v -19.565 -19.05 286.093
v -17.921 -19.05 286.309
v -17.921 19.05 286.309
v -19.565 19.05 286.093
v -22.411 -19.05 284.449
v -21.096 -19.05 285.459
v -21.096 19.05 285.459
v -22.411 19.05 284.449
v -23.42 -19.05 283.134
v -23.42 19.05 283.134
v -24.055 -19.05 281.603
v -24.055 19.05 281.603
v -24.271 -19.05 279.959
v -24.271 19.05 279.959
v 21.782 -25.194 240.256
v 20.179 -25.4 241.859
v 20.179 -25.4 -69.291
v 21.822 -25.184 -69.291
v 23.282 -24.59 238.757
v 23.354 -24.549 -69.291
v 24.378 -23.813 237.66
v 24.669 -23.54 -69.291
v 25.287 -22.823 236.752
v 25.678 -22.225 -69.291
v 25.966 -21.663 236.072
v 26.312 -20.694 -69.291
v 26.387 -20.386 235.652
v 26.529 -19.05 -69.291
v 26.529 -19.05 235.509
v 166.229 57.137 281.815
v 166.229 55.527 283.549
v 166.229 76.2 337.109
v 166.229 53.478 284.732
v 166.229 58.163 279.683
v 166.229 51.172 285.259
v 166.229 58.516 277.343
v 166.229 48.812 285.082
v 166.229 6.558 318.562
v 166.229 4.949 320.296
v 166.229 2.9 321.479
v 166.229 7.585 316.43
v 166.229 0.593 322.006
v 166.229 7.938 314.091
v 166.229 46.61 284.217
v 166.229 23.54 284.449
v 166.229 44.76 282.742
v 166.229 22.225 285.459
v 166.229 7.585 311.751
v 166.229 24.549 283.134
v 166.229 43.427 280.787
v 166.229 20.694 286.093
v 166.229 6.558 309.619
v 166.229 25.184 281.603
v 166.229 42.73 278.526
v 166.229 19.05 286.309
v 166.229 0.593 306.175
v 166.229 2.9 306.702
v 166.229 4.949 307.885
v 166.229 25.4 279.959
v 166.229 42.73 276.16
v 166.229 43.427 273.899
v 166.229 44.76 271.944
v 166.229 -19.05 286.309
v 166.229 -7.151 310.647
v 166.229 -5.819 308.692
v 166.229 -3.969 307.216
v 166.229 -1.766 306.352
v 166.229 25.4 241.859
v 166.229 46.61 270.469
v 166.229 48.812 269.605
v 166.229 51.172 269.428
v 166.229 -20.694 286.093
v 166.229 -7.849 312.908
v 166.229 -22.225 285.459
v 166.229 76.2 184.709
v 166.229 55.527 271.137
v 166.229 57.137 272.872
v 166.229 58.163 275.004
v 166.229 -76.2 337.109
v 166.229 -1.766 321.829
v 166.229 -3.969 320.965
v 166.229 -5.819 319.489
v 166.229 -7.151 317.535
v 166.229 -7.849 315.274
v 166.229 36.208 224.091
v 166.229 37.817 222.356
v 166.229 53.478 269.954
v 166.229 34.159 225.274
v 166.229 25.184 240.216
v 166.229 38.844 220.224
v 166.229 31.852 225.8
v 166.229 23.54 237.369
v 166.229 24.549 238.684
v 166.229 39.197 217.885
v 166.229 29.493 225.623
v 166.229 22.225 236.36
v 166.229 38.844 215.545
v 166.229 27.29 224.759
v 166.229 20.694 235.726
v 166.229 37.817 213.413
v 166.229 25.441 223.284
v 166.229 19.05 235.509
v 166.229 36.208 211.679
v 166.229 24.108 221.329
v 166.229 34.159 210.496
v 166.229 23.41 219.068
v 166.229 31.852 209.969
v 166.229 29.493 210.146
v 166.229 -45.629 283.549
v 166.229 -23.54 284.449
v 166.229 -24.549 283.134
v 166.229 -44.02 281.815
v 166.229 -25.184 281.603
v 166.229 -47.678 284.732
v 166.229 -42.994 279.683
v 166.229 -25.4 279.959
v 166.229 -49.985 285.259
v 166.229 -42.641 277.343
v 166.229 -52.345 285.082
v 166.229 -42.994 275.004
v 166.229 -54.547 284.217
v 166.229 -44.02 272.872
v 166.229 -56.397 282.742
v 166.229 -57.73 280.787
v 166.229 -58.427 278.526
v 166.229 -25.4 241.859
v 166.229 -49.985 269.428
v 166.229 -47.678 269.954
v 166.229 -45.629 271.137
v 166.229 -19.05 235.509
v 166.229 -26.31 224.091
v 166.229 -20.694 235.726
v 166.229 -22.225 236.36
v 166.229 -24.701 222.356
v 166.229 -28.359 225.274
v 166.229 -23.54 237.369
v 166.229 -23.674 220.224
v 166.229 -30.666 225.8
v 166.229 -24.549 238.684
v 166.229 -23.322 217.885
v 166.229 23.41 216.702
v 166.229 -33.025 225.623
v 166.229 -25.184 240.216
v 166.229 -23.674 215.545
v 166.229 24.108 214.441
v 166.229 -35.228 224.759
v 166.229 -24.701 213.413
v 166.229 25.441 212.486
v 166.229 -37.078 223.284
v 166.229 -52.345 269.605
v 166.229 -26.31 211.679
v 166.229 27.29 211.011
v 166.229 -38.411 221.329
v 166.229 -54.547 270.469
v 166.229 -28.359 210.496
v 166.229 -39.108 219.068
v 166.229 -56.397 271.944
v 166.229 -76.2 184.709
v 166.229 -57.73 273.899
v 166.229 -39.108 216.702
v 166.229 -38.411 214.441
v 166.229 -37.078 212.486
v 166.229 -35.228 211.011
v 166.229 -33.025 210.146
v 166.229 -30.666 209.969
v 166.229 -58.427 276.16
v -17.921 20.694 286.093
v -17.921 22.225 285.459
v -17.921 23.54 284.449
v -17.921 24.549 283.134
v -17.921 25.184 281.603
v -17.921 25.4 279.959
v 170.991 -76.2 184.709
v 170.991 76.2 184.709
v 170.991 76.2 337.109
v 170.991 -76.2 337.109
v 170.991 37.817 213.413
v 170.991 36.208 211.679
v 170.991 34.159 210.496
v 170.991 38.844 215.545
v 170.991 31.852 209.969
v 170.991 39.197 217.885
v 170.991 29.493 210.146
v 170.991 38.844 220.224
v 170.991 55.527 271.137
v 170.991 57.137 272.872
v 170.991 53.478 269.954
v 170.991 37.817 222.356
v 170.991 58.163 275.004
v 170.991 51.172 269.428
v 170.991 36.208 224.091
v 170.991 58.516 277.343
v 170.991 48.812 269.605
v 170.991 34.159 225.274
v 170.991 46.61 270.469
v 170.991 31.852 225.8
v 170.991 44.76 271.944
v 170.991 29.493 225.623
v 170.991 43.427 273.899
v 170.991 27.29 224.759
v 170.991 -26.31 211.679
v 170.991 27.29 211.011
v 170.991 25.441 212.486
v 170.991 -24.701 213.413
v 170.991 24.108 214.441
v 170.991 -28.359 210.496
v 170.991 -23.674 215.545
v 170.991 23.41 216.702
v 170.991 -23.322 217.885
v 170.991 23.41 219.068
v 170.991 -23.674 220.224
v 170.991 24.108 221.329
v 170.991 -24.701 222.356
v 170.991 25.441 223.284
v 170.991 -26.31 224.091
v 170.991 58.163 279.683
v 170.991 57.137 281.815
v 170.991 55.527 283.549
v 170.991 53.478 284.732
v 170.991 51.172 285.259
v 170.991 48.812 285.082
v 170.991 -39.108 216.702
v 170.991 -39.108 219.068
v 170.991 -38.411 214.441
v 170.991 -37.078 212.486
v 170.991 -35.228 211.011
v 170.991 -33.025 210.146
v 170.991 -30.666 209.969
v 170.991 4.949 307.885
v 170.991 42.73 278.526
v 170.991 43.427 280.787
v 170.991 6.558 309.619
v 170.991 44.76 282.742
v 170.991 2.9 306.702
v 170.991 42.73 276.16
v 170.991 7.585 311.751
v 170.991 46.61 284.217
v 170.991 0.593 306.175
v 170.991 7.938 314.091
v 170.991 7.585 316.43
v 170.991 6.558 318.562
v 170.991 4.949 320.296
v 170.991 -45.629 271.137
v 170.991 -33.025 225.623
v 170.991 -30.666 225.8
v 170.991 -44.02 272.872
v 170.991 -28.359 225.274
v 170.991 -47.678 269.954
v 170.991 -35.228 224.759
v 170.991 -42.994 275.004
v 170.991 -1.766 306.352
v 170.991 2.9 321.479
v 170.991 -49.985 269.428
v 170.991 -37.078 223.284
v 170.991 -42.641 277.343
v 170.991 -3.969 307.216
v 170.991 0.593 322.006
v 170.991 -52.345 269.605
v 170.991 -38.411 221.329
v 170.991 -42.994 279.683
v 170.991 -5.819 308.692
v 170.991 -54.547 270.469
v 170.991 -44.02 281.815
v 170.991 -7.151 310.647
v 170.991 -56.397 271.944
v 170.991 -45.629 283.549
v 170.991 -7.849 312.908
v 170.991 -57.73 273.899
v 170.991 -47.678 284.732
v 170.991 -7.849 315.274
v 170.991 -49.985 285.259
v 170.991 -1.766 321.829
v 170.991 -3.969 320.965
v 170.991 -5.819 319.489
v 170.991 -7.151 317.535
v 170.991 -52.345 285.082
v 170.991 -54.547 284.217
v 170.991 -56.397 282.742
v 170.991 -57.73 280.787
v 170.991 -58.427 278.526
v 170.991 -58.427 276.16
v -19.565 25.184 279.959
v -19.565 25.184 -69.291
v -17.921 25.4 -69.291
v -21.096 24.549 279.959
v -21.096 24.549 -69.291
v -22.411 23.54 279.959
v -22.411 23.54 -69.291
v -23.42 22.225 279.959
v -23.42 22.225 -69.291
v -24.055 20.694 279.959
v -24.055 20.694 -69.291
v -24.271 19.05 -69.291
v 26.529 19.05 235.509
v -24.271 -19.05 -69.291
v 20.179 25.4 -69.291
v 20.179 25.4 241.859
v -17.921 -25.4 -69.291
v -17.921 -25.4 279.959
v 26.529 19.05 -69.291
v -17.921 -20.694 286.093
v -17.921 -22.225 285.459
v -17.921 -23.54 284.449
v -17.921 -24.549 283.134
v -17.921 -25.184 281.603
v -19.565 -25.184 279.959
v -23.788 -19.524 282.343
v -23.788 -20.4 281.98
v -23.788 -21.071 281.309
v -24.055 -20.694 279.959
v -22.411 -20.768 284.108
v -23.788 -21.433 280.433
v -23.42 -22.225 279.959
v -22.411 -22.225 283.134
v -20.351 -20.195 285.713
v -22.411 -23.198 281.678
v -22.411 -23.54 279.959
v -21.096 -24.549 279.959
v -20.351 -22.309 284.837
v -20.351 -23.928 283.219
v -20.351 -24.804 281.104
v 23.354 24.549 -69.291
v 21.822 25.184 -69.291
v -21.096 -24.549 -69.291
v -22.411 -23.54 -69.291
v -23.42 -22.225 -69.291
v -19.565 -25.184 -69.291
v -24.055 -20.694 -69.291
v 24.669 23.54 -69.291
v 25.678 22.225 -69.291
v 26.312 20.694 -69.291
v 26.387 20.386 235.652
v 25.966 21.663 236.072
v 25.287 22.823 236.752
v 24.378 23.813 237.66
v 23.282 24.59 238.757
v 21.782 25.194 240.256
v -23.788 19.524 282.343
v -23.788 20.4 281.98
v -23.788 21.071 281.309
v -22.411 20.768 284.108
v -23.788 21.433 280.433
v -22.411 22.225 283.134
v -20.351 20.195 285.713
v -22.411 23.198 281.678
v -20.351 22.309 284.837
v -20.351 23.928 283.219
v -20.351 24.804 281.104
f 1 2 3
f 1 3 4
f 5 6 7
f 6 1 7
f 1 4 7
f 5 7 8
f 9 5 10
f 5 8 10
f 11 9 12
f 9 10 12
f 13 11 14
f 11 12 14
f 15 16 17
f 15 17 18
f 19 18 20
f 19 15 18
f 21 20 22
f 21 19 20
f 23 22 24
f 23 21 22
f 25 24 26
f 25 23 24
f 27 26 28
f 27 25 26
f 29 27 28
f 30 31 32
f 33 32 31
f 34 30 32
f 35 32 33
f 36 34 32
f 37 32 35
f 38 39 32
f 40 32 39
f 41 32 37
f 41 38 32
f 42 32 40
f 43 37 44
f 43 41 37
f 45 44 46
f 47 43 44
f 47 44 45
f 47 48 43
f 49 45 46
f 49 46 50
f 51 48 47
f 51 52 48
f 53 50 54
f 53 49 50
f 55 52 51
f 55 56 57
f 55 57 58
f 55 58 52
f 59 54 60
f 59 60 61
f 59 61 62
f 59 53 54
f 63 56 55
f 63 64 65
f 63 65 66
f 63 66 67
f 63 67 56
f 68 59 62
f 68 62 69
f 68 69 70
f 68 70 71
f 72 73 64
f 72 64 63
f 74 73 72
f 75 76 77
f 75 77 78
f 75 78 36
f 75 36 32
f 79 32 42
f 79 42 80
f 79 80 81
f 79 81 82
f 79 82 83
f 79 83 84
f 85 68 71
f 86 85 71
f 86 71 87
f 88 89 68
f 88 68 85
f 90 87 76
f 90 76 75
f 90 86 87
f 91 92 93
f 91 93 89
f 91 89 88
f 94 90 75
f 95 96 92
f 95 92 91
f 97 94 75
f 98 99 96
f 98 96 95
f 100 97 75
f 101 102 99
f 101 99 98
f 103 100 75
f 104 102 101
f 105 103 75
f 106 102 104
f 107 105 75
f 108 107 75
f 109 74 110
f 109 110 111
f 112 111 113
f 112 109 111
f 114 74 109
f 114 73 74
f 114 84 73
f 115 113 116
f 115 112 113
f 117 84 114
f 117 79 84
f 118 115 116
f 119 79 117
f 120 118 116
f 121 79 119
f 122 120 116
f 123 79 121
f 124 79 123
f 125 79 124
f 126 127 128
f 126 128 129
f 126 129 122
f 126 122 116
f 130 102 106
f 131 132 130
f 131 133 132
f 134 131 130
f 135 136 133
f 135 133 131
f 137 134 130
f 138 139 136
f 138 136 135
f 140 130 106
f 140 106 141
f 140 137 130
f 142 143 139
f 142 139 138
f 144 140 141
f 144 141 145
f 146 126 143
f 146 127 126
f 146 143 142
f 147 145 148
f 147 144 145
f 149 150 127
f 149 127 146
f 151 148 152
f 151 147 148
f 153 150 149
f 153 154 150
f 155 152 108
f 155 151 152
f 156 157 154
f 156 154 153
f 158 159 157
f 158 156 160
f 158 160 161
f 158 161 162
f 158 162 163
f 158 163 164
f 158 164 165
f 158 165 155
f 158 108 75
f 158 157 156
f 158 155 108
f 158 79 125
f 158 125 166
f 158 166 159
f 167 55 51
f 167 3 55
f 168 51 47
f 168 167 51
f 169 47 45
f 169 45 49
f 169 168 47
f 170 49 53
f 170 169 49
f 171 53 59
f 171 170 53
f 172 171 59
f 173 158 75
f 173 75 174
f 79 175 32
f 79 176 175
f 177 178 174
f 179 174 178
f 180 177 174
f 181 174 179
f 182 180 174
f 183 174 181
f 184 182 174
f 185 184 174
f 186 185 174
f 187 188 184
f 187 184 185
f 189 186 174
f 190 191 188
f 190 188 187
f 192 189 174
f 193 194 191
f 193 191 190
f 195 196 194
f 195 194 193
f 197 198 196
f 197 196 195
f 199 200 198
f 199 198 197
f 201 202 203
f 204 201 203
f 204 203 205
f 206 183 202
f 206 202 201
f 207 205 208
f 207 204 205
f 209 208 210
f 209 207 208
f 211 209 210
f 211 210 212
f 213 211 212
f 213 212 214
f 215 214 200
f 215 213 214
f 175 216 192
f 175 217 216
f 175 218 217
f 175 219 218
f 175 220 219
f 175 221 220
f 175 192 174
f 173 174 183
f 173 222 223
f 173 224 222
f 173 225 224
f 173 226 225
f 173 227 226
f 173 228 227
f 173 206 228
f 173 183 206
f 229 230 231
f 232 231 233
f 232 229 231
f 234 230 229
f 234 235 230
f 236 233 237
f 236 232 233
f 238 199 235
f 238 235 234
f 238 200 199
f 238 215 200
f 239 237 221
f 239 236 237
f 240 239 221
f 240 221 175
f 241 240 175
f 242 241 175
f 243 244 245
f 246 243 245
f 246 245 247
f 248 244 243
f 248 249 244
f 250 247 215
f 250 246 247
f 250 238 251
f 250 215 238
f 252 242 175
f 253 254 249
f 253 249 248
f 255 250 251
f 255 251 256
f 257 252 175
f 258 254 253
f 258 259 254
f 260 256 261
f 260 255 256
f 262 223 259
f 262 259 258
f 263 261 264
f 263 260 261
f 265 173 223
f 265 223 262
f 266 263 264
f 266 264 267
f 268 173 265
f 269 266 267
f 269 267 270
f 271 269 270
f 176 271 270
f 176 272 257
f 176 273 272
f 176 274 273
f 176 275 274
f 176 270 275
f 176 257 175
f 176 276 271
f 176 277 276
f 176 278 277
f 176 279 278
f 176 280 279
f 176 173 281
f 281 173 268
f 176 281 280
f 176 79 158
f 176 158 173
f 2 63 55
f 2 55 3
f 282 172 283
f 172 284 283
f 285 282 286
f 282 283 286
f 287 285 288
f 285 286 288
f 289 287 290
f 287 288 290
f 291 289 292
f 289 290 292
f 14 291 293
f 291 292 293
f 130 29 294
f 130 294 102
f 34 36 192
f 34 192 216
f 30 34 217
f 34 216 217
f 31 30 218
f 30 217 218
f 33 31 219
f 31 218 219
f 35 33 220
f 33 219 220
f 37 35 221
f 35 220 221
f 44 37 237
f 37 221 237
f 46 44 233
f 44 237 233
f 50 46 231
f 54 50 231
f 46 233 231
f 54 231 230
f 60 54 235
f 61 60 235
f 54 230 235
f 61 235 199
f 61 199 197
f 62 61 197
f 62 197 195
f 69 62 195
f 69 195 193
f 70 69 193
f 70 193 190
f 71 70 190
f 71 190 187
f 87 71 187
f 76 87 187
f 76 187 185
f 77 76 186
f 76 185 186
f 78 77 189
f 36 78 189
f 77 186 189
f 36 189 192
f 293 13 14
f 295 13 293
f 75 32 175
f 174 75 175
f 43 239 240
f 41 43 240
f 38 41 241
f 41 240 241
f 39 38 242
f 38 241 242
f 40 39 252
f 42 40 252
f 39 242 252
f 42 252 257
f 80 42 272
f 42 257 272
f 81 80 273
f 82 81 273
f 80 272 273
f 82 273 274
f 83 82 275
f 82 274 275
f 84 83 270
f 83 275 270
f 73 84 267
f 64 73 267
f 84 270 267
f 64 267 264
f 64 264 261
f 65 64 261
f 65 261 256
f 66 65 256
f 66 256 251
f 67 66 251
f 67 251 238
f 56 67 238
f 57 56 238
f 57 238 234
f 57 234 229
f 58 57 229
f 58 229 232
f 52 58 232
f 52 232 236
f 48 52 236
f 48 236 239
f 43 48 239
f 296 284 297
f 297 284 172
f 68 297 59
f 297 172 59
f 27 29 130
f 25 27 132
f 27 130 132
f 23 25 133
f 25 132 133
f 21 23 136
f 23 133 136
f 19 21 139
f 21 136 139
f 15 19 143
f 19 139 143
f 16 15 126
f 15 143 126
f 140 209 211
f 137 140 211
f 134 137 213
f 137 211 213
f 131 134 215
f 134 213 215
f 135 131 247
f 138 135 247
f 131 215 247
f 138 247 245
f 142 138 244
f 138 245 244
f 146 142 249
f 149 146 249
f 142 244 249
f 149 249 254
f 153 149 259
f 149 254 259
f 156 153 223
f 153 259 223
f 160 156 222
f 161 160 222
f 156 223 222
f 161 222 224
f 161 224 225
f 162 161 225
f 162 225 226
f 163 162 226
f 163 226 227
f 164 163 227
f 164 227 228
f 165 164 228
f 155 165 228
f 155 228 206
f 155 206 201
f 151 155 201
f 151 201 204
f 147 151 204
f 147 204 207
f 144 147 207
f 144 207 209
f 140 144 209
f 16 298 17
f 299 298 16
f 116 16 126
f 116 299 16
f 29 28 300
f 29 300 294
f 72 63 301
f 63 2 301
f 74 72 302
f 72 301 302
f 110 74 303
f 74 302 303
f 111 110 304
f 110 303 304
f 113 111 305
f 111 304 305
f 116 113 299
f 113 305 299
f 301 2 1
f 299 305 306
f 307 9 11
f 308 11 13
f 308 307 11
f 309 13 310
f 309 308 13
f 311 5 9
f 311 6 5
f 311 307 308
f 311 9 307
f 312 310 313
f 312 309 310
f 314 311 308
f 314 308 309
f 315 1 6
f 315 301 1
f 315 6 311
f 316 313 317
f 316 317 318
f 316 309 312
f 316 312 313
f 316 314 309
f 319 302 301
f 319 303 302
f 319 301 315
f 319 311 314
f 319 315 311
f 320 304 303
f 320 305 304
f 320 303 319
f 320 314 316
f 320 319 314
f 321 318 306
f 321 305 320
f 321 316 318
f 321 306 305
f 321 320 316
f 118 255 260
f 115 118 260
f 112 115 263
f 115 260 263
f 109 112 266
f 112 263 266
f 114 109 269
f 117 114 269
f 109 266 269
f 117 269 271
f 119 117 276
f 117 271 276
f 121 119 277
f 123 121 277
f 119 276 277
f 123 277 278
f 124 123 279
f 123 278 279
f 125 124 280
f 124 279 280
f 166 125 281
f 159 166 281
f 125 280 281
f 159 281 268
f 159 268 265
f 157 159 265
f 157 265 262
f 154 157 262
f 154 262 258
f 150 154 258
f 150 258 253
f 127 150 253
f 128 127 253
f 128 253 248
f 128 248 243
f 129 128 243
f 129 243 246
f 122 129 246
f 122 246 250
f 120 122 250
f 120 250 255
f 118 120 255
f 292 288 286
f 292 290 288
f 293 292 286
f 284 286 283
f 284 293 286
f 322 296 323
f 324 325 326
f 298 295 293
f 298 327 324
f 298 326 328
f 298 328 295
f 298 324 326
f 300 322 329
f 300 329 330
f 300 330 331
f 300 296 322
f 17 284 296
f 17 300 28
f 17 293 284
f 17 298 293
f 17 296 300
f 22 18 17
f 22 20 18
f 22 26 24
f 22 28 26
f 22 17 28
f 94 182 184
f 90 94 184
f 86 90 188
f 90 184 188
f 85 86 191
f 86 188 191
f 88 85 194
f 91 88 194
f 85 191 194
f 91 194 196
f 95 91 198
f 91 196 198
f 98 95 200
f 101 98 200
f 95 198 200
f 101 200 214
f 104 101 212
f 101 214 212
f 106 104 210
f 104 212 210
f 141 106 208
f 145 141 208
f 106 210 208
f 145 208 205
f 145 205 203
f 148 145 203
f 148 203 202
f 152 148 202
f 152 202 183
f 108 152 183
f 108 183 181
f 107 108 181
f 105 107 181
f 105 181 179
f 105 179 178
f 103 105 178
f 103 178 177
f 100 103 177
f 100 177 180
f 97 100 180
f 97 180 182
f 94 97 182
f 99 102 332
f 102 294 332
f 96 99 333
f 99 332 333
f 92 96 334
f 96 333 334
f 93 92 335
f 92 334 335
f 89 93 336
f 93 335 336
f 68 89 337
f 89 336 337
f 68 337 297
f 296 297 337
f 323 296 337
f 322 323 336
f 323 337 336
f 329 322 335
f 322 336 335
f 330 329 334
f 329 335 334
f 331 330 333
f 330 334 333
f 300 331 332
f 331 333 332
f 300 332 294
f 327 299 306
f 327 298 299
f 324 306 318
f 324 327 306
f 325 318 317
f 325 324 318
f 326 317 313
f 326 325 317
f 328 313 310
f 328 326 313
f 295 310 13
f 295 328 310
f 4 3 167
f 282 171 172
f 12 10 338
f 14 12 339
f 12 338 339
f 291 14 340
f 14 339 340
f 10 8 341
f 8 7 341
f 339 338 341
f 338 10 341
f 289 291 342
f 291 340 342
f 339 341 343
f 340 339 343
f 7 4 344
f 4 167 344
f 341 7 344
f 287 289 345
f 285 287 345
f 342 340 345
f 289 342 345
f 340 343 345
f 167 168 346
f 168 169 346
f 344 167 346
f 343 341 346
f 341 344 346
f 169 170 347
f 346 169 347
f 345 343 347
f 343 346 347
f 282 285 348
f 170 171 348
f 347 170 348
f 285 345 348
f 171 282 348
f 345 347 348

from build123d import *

# Parameters (mm, degrees)
F1_DEPTH = 25.4
F2_DEPTH = 76.2
F4_R     = 7.9375
F5_DEPTH = 12.7
F6_R     = 6.35
F7_R     = 6.35


with BuildPart() as f1:
    # F0 (on Front) → F1 (new body, symmetric)
    with BuildSketch(Plane.XZ):
        Polygon((26.5287997477, 235.5093256942), (-24.2712002523, 286.3093256942), (-24.2712002523, 235.5093256942), (-24.2712002523, -69.2906743058), (26.5287997477, -69.2906743058), align=None)
        Polygon((26.5287997477, 286.3093256942), (-24.2712002523, 286.3093256942), (26.5287997477, 235.5093256942), (166.2287997477, 235.5093256942), (166.2287997477, 286.3093256942), align=None)
    extrude(amount=F1_DEPTH, both=True)

    # F0 (on Front) → F2 (join, symmetric)
    with BuildSketch(Plane.XZ):
        Polygon((166.2287997477, 337.1093256942), (166.2287997477, 286.3093256942), (166.2287997477, 235.5093256942), (166.2287997477, 184.7093256942), (170.9912997477, 184.7093256942), (170.9912997477, 337.1093256942), align=None)
    extrude(amount=F2_DEPTH, both=True)

    # F4 (on offset) → F5 (cut, symmetric)
    with BuildSketch(Plane.YZ.offset(170.9912997477)):
        with Locations((0, 314.0905756942)):
            Circle(F4_R)
        with Locations((-50.5783743572, 277.3432357263)):
            Circle(F4_R)
        with Locations((-31.2591544485, 217.8847906621)):
            Circle(F4_R)
        with Locations((31.2591544485, 217.8847906621)):
            Circle(F4_R)
        with Locations((50.5783743572, 277.3432357263)):
            Circle(F4_R)
    extrude(amount=F5_DEPTH, both=True, mode=Mode.SUBTRACT)

    # F6
    f6_edges = [f1.edges().sort_by_distance(p)[0] for p in [
        (70.9788, -25.4, 286.309326),
        (70.9788, 25.4, 286.309326),
        (-24.2712, 0, 286.309326),
        (-24.2712, -25.4, 108.509326),
        (26.5288, -25.4, 83.109326),
        (26.5288, 25.4, 83.109326),
        (-24.2712, 25.4, 108.509326),
    ]]
    fillet(f6_edges, radius=F6_R)

    # F7
    f7_edges = [f1.edges().sort_by_distance(p)[0] for p in [
        (96.3788, -25.4, 235.509326),
        (96.3788, 25.4, 235.509326),
    ]]
    fillet(f7_edges, radius=F7_R)


solid = f1.part
